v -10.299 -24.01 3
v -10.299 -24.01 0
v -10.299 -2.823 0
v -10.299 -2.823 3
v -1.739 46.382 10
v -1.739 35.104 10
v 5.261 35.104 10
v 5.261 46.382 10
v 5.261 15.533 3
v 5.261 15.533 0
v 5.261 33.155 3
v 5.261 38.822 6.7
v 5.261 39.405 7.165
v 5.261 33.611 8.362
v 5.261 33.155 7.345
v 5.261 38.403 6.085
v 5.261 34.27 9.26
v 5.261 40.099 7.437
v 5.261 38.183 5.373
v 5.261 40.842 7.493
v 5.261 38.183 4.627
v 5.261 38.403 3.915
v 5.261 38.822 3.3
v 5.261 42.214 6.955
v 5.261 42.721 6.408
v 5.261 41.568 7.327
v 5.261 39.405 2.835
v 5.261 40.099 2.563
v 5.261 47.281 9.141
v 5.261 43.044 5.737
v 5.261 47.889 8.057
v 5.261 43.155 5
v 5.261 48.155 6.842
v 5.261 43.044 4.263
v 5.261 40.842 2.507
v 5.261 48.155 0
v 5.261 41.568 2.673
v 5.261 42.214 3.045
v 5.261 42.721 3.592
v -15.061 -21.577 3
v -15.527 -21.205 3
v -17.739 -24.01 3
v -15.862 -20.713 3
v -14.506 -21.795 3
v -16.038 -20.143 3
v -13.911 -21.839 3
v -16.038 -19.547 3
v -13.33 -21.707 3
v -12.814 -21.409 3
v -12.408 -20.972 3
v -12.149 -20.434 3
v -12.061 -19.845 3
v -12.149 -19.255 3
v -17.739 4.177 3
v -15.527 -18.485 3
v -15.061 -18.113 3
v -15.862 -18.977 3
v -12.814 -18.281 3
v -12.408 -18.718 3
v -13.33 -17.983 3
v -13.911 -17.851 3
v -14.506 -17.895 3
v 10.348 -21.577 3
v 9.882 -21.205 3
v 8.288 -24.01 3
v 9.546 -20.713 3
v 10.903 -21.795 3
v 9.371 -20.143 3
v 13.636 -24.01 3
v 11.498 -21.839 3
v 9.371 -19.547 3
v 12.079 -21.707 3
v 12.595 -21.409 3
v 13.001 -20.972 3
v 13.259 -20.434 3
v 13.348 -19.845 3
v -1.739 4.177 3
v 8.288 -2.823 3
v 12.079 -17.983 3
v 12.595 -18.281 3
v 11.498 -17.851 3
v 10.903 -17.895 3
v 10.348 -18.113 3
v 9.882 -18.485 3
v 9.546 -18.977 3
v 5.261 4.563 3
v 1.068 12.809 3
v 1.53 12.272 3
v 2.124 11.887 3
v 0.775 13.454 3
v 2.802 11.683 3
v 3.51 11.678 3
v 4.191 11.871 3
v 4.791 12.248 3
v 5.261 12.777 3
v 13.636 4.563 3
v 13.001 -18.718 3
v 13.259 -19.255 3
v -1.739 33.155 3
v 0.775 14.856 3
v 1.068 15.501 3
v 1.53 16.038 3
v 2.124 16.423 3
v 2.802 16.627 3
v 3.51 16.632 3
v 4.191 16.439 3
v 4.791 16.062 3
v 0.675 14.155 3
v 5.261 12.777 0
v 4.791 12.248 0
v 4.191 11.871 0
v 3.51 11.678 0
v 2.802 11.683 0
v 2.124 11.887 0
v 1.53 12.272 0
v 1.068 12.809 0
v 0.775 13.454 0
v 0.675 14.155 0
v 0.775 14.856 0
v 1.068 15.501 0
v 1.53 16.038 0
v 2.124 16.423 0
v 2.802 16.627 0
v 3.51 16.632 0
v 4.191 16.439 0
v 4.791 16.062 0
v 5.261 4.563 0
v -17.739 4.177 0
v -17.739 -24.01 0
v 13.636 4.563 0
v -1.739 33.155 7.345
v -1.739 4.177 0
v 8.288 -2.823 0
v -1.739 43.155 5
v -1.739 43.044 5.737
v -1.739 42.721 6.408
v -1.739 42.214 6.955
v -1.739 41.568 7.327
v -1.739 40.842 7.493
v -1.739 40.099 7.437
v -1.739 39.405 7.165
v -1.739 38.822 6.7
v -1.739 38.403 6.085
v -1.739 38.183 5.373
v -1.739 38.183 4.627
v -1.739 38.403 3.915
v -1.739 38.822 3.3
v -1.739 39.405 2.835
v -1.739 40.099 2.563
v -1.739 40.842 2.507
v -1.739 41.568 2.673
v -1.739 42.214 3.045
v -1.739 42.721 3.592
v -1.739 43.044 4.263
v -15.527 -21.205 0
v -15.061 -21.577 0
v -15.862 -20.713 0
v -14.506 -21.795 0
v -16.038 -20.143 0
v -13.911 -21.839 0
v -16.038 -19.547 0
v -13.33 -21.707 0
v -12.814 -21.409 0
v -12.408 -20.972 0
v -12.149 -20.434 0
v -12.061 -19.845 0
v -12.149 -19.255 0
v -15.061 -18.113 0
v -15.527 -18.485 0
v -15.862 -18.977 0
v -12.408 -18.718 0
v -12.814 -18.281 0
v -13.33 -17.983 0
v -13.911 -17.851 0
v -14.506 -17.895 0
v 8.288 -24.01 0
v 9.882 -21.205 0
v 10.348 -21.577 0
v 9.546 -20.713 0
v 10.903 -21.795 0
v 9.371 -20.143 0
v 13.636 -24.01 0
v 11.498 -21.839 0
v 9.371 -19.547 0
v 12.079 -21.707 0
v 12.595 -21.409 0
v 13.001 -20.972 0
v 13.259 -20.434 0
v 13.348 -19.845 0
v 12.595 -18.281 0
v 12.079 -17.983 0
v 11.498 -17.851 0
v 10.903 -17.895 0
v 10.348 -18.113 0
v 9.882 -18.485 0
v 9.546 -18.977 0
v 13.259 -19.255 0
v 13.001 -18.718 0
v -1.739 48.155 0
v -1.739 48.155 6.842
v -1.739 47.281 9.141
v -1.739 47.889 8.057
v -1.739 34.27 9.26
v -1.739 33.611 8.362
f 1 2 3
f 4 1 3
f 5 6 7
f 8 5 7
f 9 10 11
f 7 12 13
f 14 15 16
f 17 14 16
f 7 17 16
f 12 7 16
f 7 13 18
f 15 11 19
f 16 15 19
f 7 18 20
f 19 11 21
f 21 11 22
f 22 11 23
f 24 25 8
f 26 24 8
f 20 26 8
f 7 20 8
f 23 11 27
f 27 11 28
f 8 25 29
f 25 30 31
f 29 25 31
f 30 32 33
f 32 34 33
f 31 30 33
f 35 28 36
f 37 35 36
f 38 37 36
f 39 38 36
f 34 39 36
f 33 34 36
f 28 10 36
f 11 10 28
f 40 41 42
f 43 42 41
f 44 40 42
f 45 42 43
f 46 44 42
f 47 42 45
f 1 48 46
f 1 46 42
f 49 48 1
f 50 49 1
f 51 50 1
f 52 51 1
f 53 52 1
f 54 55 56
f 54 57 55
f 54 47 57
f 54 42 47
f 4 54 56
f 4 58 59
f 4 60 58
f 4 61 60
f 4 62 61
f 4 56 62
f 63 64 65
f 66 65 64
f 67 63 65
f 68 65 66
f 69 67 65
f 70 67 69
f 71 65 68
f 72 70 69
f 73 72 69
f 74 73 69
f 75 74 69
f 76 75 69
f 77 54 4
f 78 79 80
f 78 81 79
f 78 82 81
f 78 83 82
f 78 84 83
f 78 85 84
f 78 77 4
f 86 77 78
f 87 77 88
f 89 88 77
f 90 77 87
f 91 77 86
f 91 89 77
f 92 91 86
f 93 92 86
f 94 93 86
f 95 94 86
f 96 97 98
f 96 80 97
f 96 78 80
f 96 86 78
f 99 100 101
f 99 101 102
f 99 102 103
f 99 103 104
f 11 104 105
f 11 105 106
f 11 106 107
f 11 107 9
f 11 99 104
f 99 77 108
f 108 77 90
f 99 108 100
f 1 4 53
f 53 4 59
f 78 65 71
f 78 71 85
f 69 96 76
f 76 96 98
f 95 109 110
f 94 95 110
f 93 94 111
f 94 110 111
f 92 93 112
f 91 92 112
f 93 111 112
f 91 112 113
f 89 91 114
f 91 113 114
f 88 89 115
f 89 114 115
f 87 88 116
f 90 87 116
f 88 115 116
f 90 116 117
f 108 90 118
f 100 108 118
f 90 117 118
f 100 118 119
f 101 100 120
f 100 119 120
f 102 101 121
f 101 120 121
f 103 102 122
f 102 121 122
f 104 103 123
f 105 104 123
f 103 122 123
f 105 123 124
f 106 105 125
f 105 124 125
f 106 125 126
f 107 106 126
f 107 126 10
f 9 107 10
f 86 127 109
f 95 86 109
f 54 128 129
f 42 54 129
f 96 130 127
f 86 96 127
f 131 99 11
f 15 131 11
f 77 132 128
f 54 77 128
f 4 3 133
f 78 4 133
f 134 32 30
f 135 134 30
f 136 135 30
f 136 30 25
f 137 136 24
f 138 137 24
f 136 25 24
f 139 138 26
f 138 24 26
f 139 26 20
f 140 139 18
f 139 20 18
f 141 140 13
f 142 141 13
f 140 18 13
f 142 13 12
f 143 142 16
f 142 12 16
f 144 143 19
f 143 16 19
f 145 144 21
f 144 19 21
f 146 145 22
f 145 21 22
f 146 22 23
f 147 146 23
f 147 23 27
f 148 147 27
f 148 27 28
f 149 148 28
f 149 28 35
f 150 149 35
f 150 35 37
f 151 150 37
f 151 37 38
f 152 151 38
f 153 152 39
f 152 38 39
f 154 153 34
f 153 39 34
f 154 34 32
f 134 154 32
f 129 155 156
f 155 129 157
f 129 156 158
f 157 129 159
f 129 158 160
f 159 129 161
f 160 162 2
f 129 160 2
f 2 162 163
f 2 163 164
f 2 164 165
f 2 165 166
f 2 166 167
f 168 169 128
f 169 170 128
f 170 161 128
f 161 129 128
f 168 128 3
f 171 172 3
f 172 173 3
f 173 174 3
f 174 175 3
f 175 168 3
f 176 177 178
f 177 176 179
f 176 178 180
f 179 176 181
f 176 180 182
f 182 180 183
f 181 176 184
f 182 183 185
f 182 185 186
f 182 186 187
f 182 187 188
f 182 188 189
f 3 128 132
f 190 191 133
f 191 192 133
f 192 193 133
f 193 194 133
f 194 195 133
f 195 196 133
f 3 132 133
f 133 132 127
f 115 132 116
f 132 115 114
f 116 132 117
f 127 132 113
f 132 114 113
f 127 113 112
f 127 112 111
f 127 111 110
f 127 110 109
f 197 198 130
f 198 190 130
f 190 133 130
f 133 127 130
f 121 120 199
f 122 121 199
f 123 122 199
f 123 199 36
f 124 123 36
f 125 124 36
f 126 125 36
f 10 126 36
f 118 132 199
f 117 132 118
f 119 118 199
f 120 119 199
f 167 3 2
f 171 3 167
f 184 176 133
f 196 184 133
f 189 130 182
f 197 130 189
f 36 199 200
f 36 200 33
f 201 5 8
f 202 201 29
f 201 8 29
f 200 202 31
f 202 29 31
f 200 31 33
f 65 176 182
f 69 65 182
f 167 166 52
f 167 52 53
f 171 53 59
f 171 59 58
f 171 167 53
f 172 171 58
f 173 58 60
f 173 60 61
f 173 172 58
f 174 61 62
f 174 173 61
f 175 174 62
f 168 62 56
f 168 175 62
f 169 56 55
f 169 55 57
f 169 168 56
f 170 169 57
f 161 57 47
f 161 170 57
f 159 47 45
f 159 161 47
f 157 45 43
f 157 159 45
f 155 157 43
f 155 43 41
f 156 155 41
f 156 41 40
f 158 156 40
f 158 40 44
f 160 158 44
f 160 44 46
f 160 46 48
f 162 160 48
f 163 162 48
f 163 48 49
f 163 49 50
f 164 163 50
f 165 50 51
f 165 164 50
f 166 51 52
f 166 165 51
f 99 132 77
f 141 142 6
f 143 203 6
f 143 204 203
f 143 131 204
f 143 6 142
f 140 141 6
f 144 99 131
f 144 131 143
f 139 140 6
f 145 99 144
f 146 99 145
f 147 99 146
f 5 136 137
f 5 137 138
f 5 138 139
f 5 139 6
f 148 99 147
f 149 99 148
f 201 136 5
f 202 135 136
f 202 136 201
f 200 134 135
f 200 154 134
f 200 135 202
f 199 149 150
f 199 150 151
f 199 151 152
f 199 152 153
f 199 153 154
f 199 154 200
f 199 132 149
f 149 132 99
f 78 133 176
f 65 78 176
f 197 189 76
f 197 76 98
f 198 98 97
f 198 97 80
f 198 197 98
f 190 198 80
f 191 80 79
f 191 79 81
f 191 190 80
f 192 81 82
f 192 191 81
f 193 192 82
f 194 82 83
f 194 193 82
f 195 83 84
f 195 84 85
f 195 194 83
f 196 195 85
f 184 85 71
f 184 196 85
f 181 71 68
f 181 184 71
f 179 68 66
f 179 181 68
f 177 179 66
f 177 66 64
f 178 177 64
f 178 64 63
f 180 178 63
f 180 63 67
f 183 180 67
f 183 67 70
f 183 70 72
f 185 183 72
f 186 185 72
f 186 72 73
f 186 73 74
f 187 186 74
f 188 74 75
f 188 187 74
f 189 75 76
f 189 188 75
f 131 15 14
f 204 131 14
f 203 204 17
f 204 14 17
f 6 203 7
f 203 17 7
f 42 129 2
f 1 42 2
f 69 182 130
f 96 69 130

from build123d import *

# Parameters (mm, degrees)
F1_R     = 2
F2_DEPTH = 3
F3_W     = 7
F3_H     = 15
F4_DEPTH = 7
F5_R     = 2.5
F6_DEPTH = 7
F8_DEPTH = 25


with BuildPart() as f2:
    # F1 (on Top) → F2 (new body)
    with BuildSketch(Plane.XY):
        with BuildLine():
            Line((5.260746949, 48.1550168068), (-1.739253051, 48.1550168068))
            Line((-1.739253051, 48.1550168068), (-1.739253051, 4.1768743183))
            Line((-1.739253051, 4.1768743183), (-17.739253051, 4.1768743183))
            Line((-17.739253051, 4.1768743183), (-17.739253051, -24.0102637737))
            Line((-17.739253051, -24.0102637737), (-10.2988117629, -24.0102637737))
            Line((-10.2988117629, -24.0102637737), (-10.2988117629, -2.8231256817))
            Line((-10.2988117629, -2.8231256817), (8.2878154448, -2.8231256817))
            Line((8.2878154448, -2.8231256817), (8.2878154448, -24.0102637737))
            Line((8.2878154448, -24.0102637737), (13.6364829472, -24.0102637737))
            Line((13.6364829472, -24.0102637737), (13.6364829472, 4.5625712545))
            Line((13.6364829472, 4.5625712545), (5.260746949, 4.5625712545))
            Line((5.260746949, 4.5625712545), (5.260746949, 12.7772765343))
            ThreePointArc((5.260746949, 12.7772765343), (0.6746425074, 14.1550168068), (5.260746949, 15.5327570794))
            Line((5.260746949, 15.5327570794), (5.260746949, 48.1550168068))
        make_face()
        with Locations((-14.0605294946, -19.8449831932)):
            Circle(F1_R, mode=Mode.SUBTRACT)
        with Locations((11.3483034751, -19.8449831932)):
            Circle(F1_R, mode=Mode.SUBTRACT)
    extrude(amount=F2_DEPTH)

    # F3 (on face) → F4 (join)
    with BuildSketch(Plane.XY.offset(3)):
        with Locations((1.760746949, 40.6550168068)):
            Rectangle(F3_W, F3_H)
    extrude(amount=F4_DEPTH)

    # F5 (on face) → F6 (cut, through all)
    with BuildSketch(Plane.YZ.offset(5.260746949)):
        with Locations((40.6550168068, 5)):
            Circle(F5_R)
    extrude(amount=-F6_DEPTH, mode=Mode.SUBTRACT)

    # F7 (on face) → F8 (cut)
    with BuildSketch(Plane.YZ.offset(5.260746949)):
        with BuildLine():
            ThreePointArc((33.1550168068, 7.345077116), (33.9168939811, 8.8286237351), (35.1040102541, 10))
            Line((35.1040102541, 10), (33.1550168068, 10))
            Line((33.1550168068, 10), (33.1550168068, 7.345077116))
        make_face()
        with BuildLine():
            Line((48.1550168068, 10), (46.3816933334, 10))
            ThreePointArc((46.3816933334, 10), (47.6252482208, 8.6215486681), (48.1550168068, 6.8422504701))
            Line((48.1550168068, 6.8422504701), (48.1550168068, 10))
        make_face()
    extrude(amount=-F8_DEPTH, mode=Mode.SUBTRACT)


solid = f2.part
